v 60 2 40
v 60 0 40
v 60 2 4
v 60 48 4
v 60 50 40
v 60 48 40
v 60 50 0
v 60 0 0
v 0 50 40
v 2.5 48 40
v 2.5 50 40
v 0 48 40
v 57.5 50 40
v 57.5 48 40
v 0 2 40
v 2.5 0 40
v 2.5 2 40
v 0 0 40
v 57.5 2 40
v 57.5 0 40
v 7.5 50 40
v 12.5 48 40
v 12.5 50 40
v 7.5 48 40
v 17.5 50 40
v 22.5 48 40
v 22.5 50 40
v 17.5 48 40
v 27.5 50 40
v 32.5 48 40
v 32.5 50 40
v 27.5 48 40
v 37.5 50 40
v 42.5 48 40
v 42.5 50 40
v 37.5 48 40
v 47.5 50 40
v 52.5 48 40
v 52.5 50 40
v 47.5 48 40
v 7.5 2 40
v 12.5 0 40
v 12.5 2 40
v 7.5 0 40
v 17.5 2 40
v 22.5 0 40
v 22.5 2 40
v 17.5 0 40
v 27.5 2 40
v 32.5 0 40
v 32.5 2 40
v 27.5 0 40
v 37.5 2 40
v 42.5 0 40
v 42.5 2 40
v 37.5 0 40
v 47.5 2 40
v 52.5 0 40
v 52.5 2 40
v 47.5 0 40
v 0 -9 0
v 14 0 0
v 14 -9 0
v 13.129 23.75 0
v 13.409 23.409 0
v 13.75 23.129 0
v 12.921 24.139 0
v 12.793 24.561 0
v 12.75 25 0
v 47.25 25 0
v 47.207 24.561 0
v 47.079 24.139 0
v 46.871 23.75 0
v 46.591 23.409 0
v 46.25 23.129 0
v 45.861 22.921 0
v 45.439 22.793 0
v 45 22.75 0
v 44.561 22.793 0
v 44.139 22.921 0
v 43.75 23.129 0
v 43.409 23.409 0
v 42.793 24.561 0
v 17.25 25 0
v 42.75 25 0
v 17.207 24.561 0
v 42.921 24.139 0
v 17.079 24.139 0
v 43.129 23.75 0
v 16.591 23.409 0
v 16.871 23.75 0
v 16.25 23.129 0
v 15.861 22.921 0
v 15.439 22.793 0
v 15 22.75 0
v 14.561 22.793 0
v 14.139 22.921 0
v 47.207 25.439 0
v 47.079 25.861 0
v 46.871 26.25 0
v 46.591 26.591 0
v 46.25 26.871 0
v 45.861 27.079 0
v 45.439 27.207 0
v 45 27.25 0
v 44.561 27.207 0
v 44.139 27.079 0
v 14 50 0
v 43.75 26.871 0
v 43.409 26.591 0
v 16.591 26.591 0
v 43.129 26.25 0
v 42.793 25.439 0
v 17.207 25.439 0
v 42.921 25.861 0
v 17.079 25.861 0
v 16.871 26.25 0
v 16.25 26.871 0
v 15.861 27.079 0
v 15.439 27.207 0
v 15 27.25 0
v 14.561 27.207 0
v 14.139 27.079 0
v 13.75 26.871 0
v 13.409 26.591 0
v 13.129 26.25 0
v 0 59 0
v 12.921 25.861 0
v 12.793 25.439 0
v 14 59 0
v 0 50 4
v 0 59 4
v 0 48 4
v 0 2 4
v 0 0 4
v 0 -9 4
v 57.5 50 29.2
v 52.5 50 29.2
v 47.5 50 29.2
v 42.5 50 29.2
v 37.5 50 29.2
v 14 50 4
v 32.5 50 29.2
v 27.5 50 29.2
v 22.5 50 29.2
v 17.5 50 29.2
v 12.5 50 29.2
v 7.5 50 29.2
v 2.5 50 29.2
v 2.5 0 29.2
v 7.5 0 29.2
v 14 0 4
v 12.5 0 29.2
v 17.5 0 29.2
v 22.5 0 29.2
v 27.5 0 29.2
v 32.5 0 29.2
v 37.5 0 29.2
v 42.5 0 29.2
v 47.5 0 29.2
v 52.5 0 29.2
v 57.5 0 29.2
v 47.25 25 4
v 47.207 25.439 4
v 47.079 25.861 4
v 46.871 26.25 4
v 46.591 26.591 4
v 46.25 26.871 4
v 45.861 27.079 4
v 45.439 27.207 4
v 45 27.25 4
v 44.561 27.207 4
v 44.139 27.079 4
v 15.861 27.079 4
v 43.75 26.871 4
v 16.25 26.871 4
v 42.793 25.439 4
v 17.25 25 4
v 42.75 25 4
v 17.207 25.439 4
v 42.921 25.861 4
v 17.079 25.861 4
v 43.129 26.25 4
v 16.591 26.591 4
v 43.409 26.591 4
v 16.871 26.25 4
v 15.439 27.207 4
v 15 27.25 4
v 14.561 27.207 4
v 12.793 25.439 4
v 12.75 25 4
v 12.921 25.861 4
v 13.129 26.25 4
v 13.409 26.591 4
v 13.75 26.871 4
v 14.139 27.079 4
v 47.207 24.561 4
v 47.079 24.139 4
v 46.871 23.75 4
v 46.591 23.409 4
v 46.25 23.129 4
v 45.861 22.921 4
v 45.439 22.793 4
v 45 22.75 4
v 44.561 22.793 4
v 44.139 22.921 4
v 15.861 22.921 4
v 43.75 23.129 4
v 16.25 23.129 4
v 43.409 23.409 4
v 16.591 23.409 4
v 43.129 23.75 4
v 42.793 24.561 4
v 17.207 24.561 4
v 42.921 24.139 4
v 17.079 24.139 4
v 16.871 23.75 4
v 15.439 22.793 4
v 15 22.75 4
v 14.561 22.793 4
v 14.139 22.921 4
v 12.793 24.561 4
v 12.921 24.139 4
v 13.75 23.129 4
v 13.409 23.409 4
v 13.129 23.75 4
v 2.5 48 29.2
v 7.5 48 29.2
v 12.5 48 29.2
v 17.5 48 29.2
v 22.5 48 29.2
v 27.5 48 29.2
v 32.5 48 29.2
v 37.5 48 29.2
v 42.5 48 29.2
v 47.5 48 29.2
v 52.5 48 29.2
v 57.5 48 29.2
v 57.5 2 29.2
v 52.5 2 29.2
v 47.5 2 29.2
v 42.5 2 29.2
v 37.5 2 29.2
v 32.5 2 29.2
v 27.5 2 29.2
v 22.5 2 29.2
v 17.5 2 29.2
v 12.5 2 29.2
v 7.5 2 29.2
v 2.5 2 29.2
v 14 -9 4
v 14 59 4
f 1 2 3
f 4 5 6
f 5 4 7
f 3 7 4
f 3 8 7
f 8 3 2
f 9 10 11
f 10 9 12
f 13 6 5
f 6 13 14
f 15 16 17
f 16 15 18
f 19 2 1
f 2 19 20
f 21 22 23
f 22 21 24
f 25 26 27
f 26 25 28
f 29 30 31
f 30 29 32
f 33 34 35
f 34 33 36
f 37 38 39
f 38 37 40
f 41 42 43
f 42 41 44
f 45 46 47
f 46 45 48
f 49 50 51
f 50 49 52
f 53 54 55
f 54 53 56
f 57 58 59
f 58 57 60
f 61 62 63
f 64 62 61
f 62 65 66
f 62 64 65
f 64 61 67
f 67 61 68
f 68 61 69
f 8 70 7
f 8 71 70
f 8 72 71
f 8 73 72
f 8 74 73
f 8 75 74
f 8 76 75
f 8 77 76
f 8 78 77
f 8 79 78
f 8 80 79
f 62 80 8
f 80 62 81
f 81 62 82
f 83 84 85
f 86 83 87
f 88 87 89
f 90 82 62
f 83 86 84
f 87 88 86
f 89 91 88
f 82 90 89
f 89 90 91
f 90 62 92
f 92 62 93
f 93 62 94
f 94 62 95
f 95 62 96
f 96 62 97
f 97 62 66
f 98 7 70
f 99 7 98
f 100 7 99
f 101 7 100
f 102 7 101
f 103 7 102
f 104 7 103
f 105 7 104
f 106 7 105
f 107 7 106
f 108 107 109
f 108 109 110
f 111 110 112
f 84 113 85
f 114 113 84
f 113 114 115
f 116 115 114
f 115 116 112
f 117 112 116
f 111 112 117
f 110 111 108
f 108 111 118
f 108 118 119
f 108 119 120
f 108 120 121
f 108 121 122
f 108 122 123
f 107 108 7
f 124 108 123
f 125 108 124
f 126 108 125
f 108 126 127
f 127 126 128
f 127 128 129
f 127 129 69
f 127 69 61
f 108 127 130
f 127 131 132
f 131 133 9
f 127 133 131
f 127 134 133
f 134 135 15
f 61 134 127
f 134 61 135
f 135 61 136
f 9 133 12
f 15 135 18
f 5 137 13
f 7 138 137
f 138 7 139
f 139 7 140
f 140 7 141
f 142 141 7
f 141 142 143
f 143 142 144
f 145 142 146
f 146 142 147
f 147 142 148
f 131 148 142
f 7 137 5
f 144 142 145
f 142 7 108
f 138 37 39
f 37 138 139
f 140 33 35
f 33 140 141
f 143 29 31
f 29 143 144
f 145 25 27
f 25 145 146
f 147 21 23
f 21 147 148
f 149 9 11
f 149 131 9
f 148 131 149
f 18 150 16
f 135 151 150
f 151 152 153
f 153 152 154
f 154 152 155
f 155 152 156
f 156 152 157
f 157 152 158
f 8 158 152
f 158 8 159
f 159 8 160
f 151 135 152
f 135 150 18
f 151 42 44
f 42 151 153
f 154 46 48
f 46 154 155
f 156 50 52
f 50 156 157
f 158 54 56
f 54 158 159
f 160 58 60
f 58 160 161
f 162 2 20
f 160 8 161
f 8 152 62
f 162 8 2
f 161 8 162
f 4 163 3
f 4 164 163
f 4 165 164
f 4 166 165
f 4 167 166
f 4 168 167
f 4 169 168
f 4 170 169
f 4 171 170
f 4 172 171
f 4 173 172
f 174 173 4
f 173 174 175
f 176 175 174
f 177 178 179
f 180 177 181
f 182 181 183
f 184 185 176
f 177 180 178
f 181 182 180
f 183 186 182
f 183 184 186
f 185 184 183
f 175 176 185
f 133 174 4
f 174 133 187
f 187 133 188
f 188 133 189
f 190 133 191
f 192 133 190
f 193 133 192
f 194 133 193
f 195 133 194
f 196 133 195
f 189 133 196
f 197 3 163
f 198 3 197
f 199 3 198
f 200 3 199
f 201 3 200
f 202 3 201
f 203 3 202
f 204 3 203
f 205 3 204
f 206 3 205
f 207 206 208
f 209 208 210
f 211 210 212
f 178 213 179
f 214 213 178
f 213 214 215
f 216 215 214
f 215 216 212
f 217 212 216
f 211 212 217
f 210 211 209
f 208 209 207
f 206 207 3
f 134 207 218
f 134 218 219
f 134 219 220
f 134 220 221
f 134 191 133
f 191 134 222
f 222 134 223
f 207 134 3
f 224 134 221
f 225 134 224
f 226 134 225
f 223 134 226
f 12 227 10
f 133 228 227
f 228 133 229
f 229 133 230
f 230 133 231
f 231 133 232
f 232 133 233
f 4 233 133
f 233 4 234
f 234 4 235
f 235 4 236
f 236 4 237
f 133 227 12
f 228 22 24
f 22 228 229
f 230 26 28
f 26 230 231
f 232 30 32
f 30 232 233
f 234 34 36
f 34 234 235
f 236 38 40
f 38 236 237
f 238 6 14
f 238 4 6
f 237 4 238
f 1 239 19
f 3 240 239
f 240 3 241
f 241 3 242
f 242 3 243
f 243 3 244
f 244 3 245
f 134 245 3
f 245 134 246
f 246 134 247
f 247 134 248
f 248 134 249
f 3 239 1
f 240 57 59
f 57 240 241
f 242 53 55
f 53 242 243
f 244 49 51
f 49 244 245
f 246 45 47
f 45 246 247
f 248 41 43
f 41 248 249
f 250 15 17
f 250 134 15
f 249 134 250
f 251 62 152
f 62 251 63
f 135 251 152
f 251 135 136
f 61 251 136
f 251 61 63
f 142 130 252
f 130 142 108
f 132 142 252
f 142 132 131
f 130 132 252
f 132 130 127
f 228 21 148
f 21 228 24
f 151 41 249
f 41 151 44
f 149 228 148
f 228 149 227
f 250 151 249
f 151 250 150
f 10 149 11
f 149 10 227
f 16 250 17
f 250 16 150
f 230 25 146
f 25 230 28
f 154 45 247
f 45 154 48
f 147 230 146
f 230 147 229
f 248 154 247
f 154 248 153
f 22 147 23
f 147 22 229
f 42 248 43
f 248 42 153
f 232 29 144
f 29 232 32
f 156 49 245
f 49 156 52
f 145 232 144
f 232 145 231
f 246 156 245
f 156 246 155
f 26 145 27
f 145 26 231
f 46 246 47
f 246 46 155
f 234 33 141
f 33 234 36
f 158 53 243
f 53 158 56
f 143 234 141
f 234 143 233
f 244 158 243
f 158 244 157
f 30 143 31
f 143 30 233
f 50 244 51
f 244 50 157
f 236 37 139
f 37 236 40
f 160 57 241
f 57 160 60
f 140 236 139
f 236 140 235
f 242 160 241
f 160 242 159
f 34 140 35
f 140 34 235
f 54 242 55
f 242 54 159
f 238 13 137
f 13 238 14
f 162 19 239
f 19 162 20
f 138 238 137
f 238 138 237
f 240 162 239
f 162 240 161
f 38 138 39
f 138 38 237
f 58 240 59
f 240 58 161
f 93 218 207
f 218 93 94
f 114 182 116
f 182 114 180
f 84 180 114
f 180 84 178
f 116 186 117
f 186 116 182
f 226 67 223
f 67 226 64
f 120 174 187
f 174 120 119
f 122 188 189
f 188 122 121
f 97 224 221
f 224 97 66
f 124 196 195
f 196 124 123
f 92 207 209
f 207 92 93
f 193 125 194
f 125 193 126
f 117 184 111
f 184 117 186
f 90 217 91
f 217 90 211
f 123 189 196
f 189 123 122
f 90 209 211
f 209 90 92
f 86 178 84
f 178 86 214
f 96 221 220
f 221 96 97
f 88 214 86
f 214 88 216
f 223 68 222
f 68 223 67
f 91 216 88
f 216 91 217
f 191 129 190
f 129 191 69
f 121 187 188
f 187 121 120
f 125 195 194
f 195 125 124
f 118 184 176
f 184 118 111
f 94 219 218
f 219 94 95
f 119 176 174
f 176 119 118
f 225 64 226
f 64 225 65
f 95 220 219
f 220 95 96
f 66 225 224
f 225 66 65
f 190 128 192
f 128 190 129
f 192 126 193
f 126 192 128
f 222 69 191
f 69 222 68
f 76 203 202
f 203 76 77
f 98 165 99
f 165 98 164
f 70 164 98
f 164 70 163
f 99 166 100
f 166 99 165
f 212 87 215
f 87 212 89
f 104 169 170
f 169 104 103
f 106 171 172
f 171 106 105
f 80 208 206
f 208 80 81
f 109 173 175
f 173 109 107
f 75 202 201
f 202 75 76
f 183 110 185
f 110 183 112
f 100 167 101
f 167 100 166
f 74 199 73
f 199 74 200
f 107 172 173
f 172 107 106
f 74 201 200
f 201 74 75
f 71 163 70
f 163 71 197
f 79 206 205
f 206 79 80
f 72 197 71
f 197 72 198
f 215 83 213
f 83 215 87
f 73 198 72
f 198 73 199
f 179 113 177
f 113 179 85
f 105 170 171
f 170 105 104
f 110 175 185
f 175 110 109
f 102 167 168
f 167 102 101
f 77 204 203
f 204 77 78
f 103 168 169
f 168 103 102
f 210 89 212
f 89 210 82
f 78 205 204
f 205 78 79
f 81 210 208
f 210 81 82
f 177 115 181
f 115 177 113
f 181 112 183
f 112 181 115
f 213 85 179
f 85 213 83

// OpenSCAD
$fn = 32;

// ----------------------------------------------------------------------
// Cable duct: 60 x 50 x 40 mm, 6 fingers
// ----------------------------------------------------------------------

// --- parameters (mm) ---
channel_l = 60;           // duct length, X
channel_w = 50;           // duct width, Y
channel_h = 40;           // duct height, Z
channel_t = 2;            // side wall thickness
floor_t = 4;              // floor thickness
slot_w = 5;               // finger slot width
slot_h = 25.2;            // finger slot height
fingers = 6;              // number of finger slots per side
pitch = 10;               // finger pitch
hole_d = 4.5;             // floor mounting hole
hole_n = 2;               // mounting holes in the floor
ear_w = 10;               // mounting ear width
ear_l = 14;               // mounting ear length

module shell() {
  difference() {
    cube([channel_l, channel_w, channel_h]);
    /* open top channel */
    translate([-channel_t - 1, channel_t, floor_t])
      cube([channel_l + 2 * channel_t + 2, channel_w - 2 * channel_t, channel_h + 1]);
  }
}

module ears() {
  translate([0, -ear_w + 1, 0]) cube([ear_l, ear_w, floor_t]);
  translate([0, channel_w - 1, 0]) cube([ear_l, ear_w, floor_t]);
}

difference() {
  union() {
    shell();
    ears();
  }
  /* finger slots cut through both side walls */
  for (i = [0 : fingers - 1]) translate([pitch / 2 + i * pitch - slot_w / 2, -1, floor_t + slot_h]) cube([slot_w, channel_w + 2, channel_h]);
  for (i = [0 : hole_n - 1]) translate([(channel_l / hole_n) * (i + 0.5), channel_w / 2, -1]) cylinder(h = floor_t + 2, d = hole_d);
}
